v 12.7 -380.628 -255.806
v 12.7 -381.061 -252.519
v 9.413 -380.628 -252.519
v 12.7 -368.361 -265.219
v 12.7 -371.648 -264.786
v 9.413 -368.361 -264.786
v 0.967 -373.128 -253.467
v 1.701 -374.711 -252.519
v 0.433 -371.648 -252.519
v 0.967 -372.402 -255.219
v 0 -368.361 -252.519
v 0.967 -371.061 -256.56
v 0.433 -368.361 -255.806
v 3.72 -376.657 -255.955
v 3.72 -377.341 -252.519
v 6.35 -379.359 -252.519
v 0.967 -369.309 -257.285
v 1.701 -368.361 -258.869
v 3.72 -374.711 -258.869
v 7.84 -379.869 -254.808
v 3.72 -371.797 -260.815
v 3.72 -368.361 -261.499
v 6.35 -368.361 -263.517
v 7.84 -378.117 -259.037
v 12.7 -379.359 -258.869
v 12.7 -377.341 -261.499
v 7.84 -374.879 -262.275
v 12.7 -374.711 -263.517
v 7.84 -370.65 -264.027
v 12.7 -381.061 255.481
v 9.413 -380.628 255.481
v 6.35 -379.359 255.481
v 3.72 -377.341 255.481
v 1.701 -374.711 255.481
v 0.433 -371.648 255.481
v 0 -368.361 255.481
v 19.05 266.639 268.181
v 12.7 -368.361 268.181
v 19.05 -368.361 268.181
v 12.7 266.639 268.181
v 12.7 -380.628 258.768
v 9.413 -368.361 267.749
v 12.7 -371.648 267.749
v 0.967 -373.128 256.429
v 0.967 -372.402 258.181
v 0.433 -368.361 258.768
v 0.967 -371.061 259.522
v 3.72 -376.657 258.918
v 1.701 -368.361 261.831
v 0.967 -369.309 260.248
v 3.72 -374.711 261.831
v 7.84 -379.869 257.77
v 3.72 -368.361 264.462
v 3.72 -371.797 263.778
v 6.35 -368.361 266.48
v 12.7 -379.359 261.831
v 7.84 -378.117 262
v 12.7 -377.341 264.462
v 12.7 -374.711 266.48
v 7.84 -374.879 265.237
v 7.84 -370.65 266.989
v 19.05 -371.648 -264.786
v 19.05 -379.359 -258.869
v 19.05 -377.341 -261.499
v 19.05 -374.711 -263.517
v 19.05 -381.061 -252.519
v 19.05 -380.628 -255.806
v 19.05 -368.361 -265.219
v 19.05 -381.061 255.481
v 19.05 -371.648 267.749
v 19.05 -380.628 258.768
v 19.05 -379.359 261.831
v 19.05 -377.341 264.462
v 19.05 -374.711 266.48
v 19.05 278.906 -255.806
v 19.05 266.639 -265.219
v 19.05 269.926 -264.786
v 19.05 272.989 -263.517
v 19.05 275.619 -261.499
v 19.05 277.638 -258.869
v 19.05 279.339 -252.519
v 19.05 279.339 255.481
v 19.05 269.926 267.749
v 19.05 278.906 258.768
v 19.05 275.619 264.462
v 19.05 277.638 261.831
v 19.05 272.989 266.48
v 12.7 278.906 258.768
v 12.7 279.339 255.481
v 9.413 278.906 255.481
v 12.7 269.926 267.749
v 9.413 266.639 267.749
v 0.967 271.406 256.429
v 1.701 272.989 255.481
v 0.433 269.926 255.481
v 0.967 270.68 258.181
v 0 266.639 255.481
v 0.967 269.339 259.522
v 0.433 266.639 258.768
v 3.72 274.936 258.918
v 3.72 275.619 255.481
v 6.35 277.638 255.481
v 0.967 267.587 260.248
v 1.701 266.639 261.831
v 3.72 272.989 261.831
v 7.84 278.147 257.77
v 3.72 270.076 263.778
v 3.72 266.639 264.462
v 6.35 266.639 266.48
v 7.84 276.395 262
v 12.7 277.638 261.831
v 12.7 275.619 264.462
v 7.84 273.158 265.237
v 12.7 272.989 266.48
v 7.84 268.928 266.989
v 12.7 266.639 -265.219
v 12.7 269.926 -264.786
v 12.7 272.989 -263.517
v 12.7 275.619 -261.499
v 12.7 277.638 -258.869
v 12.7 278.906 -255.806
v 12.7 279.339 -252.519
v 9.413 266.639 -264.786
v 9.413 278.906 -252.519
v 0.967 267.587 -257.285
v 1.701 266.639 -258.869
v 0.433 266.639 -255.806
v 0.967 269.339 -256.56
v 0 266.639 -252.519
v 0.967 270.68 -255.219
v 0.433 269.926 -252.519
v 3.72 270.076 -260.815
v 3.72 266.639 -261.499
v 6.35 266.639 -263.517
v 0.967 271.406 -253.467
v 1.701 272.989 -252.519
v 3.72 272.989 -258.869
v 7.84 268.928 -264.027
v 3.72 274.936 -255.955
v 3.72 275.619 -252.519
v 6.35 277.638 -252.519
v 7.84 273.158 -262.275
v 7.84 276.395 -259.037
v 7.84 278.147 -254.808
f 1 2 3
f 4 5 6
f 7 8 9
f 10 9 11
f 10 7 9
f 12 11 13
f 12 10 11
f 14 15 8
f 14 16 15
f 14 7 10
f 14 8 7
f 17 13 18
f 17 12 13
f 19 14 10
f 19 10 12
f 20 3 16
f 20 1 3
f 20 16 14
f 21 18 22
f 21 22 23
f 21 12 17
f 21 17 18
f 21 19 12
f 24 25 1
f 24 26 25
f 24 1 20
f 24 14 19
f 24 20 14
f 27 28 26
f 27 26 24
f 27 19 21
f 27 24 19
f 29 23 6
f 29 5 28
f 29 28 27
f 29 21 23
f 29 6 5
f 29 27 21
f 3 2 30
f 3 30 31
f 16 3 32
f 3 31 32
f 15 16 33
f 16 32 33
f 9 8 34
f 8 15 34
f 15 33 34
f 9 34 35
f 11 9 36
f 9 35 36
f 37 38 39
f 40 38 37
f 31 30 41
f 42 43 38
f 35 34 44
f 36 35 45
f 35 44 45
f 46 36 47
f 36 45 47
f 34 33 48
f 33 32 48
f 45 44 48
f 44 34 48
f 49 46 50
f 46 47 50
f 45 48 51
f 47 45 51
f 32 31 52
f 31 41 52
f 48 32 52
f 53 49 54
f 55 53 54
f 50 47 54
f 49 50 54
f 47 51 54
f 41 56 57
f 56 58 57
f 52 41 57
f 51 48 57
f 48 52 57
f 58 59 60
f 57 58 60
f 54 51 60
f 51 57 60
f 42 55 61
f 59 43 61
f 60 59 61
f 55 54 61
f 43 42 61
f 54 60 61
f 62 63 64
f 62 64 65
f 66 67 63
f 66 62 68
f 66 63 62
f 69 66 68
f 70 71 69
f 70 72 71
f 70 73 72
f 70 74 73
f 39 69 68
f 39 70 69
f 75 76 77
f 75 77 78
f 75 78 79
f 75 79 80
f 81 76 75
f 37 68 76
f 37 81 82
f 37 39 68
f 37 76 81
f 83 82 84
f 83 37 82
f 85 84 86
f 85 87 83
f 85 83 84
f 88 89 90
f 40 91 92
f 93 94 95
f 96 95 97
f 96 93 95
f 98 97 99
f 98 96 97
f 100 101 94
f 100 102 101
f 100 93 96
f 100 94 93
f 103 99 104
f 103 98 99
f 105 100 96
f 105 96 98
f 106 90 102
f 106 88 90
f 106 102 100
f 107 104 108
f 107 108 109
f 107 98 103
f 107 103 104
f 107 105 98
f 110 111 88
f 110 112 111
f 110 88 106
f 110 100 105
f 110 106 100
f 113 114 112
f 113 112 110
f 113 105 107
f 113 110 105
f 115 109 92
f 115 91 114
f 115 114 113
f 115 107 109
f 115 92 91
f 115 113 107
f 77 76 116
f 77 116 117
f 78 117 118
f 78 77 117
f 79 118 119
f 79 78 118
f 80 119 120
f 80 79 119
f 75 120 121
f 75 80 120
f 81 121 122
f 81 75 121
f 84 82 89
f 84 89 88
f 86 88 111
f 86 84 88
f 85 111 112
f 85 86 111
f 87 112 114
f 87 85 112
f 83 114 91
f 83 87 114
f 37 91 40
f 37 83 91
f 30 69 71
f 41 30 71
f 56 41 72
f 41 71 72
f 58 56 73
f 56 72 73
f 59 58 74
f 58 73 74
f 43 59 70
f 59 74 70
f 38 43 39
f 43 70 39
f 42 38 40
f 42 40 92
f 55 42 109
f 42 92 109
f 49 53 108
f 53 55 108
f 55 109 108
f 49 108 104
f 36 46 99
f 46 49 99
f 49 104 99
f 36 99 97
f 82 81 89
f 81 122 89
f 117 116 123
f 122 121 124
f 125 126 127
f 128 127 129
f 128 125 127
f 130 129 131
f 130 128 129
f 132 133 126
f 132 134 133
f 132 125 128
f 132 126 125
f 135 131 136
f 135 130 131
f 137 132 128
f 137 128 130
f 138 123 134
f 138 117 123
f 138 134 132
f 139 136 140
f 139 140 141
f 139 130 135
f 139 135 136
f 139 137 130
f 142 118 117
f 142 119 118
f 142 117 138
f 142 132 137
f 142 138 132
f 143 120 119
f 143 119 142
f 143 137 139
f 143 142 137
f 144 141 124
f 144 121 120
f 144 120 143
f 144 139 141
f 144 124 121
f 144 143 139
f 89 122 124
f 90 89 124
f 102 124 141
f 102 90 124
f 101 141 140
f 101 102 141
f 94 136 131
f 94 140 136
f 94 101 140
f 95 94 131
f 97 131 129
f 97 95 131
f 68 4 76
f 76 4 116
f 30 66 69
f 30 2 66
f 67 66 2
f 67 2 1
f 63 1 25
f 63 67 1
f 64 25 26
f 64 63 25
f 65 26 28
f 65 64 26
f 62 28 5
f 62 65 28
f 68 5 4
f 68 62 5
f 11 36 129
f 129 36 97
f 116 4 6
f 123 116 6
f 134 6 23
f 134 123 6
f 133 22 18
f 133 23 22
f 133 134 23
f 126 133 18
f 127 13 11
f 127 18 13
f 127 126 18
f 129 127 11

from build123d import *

# Parameters (mm, degrees)
F0_W     = 660.4
F0_H     = 533.4
F1_DEPTH = 19.05
F3_R     = 12.7


# Not quite as in the source:
# - two fillets or chamfers of one size are made in one step
# - a feature of the source that left no trace in its solid (it failed there, or was rolled back) is left out


with BuildPart() as f1:
    # F0 (on Right) → F1 (new body)
    with BuildSketch(Plane.YZ):
        with Locations((-50.8608140139, 1.481294632)):
            Rectangle(F0_W, F0_H)
    extrude(amount=F1_DEPTH)

    # F3
    f3_edges = [f1.edges().sort_by_distance(p)[0] for p in [
        (9.525, -381.060814, 268.181295),
        (9.525, -381.060814, -265.218705),
        (0, -381.060814, 1.481295),
        (9.525, 279.339186, -265.218705),
        (0, -50.860814, -265.218705),
        (9.525, 279.339186, 268.181295),
        (0, 279.339186, 1.481295),
        (0, -50.860814, 268.181295),
    ]]
    fillet(f3_edges, radius=F3_R)


solid = f1.part
